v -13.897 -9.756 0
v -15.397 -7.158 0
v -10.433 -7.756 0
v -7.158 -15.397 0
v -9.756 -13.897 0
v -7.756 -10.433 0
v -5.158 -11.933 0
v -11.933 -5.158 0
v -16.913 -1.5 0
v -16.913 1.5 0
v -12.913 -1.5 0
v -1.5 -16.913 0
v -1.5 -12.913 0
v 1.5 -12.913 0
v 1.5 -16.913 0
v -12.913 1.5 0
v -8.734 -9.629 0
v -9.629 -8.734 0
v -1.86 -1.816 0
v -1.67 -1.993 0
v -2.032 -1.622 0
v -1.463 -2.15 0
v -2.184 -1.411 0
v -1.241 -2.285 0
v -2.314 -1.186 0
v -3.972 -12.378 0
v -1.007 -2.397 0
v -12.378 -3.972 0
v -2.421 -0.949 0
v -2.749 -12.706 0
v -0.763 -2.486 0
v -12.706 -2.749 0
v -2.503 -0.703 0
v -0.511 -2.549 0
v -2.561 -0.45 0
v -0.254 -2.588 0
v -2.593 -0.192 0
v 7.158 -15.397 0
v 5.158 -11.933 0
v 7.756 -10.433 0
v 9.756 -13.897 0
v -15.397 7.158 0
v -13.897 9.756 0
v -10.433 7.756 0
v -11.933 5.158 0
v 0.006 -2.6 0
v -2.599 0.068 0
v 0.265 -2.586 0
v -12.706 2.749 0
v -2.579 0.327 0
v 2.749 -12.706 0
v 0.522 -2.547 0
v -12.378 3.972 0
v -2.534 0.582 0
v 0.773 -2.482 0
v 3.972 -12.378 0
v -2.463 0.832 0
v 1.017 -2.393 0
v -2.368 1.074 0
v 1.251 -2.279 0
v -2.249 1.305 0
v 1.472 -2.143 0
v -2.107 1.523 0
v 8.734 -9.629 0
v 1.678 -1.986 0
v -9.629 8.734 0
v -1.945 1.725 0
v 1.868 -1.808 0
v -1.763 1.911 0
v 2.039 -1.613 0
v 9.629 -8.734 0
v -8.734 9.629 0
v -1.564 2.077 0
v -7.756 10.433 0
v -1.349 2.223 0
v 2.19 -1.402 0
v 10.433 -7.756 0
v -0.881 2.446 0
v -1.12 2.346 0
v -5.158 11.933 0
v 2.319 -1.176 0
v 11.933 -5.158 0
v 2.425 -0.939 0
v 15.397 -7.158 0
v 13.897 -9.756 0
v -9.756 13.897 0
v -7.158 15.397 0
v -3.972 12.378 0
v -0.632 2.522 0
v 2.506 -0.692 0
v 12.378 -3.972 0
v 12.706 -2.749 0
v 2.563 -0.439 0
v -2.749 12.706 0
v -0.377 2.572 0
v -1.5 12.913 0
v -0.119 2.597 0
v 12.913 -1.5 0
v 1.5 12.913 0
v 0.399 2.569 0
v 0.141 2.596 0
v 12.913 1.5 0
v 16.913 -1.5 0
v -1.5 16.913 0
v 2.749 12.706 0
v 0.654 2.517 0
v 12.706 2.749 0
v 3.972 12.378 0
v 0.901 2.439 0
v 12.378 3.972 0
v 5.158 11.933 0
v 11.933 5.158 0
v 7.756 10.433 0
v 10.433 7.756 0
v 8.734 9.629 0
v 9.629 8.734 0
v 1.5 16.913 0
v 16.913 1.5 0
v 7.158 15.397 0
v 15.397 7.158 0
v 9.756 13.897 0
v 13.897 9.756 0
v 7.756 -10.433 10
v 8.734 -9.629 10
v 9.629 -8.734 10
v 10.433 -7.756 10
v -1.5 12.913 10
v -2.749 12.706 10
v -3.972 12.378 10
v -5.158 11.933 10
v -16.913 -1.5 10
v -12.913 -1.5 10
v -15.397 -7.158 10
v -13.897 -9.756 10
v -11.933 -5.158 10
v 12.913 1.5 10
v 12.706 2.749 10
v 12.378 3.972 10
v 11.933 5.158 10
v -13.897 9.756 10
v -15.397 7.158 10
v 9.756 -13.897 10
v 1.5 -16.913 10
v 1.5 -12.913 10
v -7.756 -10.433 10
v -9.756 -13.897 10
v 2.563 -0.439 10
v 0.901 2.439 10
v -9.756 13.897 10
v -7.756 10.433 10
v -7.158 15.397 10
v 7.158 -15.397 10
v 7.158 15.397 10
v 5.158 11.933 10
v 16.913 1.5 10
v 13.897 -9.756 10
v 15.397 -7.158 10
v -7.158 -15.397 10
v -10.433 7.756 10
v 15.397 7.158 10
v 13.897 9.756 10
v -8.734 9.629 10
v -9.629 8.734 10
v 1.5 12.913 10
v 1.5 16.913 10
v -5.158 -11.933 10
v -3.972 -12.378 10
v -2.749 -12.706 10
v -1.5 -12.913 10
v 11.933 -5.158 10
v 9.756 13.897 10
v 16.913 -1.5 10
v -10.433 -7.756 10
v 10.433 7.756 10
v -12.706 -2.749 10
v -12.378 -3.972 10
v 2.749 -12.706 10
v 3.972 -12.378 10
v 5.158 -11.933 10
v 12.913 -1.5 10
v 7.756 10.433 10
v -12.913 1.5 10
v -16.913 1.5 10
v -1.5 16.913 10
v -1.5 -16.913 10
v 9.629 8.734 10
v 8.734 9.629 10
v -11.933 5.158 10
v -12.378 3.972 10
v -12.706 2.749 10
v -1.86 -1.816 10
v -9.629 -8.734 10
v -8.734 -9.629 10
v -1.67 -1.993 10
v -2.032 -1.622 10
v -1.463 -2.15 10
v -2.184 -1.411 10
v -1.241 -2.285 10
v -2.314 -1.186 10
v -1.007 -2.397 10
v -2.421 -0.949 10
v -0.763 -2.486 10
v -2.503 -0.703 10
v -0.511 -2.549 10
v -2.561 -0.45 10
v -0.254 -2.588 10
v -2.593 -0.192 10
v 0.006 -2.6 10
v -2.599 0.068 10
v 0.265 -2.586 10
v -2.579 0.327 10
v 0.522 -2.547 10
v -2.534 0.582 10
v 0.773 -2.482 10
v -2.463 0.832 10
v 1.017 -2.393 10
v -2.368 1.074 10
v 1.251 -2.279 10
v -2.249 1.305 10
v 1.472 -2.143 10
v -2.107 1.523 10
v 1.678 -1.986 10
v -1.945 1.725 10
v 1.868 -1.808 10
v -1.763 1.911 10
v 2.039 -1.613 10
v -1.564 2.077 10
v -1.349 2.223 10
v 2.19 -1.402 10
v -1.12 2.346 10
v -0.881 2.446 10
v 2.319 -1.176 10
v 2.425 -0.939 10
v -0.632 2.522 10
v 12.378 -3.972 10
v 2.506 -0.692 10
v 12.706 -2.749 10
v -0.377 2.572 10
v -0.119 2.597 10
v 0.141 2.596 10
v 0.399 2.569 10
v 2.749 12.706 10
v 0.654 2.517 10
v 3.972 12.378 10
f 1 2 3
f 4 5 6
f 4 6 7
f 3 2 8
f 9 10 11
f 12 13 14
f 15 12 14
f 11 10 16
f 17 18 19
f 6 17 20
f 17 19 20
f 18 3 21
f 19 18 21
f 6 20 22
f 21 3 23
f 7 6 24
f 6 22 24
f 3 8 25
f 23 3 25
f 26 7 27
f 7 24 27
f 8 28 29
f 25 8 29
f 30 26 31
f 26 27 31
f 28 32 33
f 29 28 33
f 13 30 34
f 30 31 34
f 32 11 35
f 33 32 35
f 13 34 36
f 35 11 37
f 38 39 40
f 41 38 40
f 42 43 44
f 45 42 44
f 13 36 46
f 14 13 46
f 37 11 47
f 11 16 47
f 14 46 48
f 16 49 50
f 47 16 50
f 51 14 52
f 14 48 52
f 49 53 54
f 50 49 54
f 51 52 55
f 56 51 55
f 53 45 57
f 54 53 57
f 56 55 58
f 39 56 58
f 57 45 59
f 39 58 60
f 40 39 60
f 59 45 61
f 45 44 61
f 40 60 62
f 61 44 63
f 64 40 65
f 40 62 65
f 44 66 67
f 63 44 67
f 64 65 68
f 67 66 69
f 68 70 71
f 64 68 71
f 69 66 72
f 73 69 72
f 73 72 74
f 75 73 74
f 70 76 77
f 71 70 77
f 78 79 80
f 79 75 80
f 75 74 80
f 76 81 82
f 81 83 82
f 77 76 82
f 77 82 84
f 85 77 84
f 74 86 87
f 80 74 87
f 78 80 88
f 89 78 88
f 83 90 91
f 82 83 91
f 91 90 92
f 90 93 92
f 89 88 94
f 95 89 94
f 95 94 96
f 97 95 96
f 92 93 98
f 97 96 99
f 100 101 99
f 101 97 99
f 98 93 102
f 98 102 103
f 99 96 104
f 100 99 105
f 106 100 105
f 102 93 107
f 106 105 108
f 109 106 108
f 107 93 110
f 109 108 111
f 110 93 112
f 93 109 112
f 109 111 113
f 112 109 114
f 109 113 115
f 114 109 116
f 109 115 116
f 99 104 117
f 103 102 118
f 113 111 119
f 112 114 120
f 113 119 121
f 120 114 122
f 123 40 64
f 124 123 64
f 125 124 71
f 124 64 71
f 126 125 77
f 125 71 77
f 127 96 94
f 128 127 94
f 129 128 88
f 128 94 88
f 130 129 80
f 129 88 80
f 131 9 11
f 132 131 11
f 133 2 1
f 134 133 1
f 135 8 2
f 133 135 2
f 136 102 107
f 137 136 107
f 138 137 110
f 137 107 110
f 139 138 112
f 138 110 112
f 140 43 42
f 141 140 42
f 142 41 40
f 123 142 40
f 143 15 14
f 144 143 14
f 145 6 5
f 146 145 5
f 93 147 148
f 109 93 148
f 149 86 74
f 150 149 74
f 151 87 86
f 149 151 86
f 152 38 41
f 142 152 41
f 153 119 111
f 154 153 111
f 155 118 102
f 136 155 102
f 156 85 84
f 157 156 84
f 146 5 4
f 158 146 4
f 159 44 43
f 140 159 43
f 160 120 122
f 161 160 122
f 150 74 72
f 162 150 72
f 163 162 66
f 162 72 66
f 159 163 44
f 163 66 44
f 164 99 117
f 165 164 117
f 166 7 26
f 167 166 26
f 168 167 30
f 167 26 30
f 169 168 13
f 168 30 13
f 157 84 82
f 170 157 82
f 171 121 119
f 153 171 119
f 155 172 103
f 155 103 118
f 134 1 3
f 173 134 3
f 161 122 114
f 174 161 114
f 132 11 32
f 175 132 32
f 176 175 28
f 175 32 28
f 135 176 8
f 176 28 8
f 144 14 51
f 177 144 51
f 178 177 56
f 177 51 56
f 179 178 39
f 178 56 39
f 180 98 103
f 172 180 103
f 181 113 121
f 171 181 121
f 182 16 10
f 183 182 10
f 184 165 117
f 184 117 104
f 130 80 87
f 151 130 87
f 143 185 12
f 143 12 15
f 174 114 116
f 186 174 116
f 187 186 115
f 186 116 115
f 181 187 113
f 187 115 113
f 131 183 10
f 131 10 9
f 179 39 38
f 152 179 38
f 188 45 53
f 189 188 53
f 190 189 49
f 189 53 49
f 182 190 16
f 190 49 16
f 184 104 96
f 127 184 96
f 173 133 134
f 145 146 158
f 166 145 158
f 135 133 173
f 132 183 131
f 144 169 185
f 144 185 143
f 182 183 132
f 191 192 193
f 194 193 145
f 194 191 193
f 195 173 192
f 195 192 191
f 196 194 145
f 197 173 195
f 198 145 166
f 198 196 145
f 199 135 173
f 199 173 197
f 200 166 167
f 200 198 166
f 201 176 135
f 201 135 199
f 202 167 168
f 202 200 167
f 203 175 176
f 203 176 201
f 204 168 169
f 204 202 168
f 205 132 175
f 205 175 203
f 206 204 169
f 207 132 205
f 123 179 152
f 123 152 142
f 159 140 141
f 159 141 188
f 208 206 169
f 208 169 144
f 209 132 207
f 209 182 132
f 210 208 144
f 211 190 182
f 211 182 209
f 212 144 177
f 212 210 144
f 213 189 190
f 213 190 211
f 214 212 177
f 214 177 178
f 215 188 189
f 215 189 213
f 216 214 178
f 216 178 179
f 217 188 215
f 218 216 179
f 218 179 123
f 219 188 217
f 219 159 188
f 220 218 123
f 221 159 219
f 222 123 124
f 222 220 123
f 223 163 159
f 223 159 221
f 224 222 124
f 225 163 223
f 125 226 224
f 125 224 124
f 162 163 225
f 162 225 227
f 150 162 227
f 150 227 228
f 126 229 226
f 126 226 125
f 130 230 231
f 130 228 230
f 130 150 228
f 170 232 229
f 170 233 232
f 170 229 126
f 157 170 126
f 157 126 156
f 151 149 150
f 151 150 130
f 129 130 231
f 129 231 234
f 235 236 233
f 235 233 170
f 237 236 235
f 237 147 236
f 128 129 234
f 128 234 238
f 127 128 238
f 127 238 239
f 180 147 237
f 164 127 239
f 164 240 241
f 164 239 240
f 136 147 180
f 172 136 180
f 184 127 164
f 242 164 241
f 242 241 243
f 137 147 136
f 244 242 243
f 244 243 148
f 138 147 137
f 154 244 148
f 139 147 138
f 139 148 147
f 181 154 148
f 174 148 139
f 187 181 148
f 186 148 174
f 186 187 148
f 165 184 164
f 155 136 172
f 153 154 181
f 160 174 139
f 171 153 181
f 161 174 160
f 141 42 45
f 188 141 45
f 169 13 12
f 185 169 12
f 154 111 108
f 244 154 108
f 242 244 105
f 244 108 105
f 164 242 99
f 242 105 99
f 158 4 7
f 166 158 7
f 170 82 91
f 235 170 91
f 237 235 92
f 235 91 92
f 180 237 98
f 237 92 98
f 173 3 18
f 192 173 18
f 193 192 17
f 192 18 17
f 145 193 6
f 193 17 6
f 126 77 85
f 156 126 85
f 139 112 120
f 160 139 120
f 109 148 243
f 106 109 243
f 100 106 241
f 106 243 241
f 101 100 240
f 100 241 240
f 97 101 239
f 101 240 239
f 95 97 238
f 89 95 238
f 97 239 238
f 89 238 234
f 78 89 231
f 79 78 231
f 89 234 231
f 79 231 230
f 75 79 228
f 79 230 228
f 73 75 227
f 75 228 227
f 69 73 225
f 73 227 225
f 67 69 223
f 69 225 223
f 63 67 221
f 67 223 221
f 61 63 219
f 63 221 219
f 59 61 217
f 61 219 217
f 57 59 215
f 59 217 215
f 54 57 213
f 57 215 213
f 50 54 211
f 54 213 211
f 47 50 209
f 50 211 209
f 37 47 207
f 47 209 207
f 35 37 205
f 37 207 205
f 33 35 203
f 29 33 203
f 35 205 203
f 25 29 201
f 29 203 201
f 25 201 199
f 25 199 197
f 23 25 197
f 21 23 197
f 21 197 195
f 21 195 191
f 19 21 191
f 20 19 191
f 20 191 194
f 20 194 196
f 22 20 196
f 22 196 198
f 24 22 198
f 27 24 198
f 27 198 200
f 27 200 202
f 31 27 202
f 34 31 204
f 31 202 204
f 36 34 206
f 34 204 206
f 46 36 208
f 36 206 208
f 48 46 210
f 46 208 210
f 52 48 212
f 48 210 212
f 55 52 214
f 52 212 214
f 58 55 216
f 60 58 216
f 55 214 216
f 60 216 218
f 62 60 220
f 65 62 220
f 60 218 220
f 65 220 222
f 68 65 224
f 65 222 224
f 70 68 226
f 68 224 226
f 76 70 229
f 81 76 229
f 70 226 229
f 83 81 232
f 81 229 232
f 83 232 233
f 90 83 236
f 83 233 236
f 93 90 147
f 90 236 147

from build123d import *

# Parameters (mm, degrees)
BOSS_EXTRUDE1_DEPTH = 10
CUT_EXTRUDE1_DEPTH  = 10


with BuildPart() as part:
    # Sketch1 → Boss-Extrude1 (new body)
    with BuildSketch(Plane.XY):
        with BuildLine():
            Line((-1.5, 16.91317157), (-1.5, 12.91317157))
            ThreePointArc((-1.5, 12.91317157), (-3.364647586, 12.557035742), (-5.157547679, 11.933134623))
            Line((-5.157547679, 11.933134623), (-7.157547679, 15.397236238))
            Line((-7.157547679, 15.397236238), (-9.755623891, 13.897236238))
            Line((-9.755623891, 13.897236238), (-7.755623891, 10.433134623))
            ThreePointArc((-7.755623891, 10.433134623), (-9.192388155, 9.192388155), (-10.433134623, 7.755623891))
            Line((-10.433134623, 7.755623891), (-13.897236238, 9.755623891))
            Line((-13.897236238, 9.755623891), (-15.397236238, 7.157547679))
            Line((-15.397236238, 7.157547679), (-11.933134623, 5.157547679))
            ThreePointArc((-11.933134623, 5.157547679), (-12.557035742, 3.364647586), (-12.91317157, 1.5))
            Line((-12.91317157, 1.5), (-16.91317157, 1.5))
            Line((-16.91317157, 1.5), (-16.91317157, -1.5))
            Line((-16.91317157, -1.5), (-12.91317157, -1.5))
            ThreePointArc((-12.91317157, -1.5), (-12.557035742, -3.364647586), (-11.933134623, -5.157547679))
            Line((-11.933134623, -5.157547679), (-15.397236238, -7.157547679))
            Line((-15.397236238, -7.157547679), (-13.897236238, -9.755623891))
            Line((-13.897236238, -9.755623891), (-10.433134623, -7.755623891))
            ThreePointArc((-10.433134623, -7.755623891), (-9.192388155, -9.192388155), (-7.755623891, -10.433134623))
            Line((-7.755623891, -10.433134623), (-9.755623891, -13.897236238))
            Line((-9.755623891, -13.897236238), (-7.157547679, -15.397236238))
            Line((-7.157547679, -15.397236238), (-5.157547679, -11.933134623))
            ThreePointArc((-5.157547679, -11.933134623), (-3.364647586, -12.557035742), (-1.5, -12.91317157))
            Line((-1.5, -12.91317157), (-1.5, -16.91317157))
            Line((-1.5, -16.91317157), (1.5, -16.91317157))
            Line((1.5, -16.91317157), (1.5, -12.91317157))
            ThreePointArc((1.5, -12.91317157), (3.364647586, -12.557035742), (5.157547679, -11.933134623))
            Line((5.157547679, -11.933134623), (7.157547679, -15.397236238))
            Line((7.157547679, -15.397236238), (9.755623891, -13.897236238))
            Line((9.755623891, -13.897236238), (7.755623891, -10.433134623))
            ThreePointArc((7.755623891, -10.433134623), (9.192388155, -9.192388155), (10.433134623, -7.755623891))
            Line((10.433134623, -7.755623891), (13.897236238, -9.755623891))
            Line((13.897236238, -9.755623891), (15.397236238, -7.157547679))
            Line((15.397236238, -7.157547679), (11.933134623, -5.157547679))
            ThreePointArc((11.933134623, -5.157547679), (12.557035742, -3.364647586), (12.91317157, -1.5))
            Line((12.91317157, -1.5), (16.91317157, -1.5))
            Line((16.91317157, -1.5), (16.91317157, 1.5))
            Line((16.91317157, 1.5), (12.91317157, 1.5))
            ThreePointArc((12.91317157, 1.5), (12.557035742, 3.364647586), (11.933134623, 5.157547679))
            Line((11.933134623, 5.157547679), (15.397236238, 7.157547679))
            Line((15.397236238, 7.157547679), (13.897236238, 9.755623891))
            Line((13.897236238, 9.755623891), (10.433134623, 7.755623891))
            ThreePointArc((10.433134623, 7.755623891), (9.192388155, 9.192388155), (7.755623891, 10.433134623))
            Line((7.755623891, 10.433134623), (9.755623891, 13.897236238))
            Line((9.755623891, 13.897236238), (7.157547679, 15.397236238))
            Line((7.157547679, 15.397236238), (5.157547679, 11.933134623))
            ThreePointArc((5.157547679, 11.933134623), (3.364647586, 12.557035742), (1.5, 12.91317157))
            Line((1.5, 12.91317157), (1.5, 16.91317157))
            Line((1.5, 16.91317157), (-1.5, 16.91317157))
        make_face()
    extrude(amount=BOSS_EXTRUDE1_DEPTH)

    # Sketch2 → Cut-Extrude1 (cut)
    with BuildSketch(Plane.XY.offset(10)):
        with BuildLine():
            Line((2.562713194, -0.438749457), (0.901388421, 2.438749457))
            ThreePointArc((0.901388421, 2.438749457), (-2.25166605, -1.3), (2.562713194, -0.438749457))
        make_face()
    extrude(amount=-CUT_EXTRUDE1_DEPTH, mode=Mode.SUBTRACT)


solid = part.part
